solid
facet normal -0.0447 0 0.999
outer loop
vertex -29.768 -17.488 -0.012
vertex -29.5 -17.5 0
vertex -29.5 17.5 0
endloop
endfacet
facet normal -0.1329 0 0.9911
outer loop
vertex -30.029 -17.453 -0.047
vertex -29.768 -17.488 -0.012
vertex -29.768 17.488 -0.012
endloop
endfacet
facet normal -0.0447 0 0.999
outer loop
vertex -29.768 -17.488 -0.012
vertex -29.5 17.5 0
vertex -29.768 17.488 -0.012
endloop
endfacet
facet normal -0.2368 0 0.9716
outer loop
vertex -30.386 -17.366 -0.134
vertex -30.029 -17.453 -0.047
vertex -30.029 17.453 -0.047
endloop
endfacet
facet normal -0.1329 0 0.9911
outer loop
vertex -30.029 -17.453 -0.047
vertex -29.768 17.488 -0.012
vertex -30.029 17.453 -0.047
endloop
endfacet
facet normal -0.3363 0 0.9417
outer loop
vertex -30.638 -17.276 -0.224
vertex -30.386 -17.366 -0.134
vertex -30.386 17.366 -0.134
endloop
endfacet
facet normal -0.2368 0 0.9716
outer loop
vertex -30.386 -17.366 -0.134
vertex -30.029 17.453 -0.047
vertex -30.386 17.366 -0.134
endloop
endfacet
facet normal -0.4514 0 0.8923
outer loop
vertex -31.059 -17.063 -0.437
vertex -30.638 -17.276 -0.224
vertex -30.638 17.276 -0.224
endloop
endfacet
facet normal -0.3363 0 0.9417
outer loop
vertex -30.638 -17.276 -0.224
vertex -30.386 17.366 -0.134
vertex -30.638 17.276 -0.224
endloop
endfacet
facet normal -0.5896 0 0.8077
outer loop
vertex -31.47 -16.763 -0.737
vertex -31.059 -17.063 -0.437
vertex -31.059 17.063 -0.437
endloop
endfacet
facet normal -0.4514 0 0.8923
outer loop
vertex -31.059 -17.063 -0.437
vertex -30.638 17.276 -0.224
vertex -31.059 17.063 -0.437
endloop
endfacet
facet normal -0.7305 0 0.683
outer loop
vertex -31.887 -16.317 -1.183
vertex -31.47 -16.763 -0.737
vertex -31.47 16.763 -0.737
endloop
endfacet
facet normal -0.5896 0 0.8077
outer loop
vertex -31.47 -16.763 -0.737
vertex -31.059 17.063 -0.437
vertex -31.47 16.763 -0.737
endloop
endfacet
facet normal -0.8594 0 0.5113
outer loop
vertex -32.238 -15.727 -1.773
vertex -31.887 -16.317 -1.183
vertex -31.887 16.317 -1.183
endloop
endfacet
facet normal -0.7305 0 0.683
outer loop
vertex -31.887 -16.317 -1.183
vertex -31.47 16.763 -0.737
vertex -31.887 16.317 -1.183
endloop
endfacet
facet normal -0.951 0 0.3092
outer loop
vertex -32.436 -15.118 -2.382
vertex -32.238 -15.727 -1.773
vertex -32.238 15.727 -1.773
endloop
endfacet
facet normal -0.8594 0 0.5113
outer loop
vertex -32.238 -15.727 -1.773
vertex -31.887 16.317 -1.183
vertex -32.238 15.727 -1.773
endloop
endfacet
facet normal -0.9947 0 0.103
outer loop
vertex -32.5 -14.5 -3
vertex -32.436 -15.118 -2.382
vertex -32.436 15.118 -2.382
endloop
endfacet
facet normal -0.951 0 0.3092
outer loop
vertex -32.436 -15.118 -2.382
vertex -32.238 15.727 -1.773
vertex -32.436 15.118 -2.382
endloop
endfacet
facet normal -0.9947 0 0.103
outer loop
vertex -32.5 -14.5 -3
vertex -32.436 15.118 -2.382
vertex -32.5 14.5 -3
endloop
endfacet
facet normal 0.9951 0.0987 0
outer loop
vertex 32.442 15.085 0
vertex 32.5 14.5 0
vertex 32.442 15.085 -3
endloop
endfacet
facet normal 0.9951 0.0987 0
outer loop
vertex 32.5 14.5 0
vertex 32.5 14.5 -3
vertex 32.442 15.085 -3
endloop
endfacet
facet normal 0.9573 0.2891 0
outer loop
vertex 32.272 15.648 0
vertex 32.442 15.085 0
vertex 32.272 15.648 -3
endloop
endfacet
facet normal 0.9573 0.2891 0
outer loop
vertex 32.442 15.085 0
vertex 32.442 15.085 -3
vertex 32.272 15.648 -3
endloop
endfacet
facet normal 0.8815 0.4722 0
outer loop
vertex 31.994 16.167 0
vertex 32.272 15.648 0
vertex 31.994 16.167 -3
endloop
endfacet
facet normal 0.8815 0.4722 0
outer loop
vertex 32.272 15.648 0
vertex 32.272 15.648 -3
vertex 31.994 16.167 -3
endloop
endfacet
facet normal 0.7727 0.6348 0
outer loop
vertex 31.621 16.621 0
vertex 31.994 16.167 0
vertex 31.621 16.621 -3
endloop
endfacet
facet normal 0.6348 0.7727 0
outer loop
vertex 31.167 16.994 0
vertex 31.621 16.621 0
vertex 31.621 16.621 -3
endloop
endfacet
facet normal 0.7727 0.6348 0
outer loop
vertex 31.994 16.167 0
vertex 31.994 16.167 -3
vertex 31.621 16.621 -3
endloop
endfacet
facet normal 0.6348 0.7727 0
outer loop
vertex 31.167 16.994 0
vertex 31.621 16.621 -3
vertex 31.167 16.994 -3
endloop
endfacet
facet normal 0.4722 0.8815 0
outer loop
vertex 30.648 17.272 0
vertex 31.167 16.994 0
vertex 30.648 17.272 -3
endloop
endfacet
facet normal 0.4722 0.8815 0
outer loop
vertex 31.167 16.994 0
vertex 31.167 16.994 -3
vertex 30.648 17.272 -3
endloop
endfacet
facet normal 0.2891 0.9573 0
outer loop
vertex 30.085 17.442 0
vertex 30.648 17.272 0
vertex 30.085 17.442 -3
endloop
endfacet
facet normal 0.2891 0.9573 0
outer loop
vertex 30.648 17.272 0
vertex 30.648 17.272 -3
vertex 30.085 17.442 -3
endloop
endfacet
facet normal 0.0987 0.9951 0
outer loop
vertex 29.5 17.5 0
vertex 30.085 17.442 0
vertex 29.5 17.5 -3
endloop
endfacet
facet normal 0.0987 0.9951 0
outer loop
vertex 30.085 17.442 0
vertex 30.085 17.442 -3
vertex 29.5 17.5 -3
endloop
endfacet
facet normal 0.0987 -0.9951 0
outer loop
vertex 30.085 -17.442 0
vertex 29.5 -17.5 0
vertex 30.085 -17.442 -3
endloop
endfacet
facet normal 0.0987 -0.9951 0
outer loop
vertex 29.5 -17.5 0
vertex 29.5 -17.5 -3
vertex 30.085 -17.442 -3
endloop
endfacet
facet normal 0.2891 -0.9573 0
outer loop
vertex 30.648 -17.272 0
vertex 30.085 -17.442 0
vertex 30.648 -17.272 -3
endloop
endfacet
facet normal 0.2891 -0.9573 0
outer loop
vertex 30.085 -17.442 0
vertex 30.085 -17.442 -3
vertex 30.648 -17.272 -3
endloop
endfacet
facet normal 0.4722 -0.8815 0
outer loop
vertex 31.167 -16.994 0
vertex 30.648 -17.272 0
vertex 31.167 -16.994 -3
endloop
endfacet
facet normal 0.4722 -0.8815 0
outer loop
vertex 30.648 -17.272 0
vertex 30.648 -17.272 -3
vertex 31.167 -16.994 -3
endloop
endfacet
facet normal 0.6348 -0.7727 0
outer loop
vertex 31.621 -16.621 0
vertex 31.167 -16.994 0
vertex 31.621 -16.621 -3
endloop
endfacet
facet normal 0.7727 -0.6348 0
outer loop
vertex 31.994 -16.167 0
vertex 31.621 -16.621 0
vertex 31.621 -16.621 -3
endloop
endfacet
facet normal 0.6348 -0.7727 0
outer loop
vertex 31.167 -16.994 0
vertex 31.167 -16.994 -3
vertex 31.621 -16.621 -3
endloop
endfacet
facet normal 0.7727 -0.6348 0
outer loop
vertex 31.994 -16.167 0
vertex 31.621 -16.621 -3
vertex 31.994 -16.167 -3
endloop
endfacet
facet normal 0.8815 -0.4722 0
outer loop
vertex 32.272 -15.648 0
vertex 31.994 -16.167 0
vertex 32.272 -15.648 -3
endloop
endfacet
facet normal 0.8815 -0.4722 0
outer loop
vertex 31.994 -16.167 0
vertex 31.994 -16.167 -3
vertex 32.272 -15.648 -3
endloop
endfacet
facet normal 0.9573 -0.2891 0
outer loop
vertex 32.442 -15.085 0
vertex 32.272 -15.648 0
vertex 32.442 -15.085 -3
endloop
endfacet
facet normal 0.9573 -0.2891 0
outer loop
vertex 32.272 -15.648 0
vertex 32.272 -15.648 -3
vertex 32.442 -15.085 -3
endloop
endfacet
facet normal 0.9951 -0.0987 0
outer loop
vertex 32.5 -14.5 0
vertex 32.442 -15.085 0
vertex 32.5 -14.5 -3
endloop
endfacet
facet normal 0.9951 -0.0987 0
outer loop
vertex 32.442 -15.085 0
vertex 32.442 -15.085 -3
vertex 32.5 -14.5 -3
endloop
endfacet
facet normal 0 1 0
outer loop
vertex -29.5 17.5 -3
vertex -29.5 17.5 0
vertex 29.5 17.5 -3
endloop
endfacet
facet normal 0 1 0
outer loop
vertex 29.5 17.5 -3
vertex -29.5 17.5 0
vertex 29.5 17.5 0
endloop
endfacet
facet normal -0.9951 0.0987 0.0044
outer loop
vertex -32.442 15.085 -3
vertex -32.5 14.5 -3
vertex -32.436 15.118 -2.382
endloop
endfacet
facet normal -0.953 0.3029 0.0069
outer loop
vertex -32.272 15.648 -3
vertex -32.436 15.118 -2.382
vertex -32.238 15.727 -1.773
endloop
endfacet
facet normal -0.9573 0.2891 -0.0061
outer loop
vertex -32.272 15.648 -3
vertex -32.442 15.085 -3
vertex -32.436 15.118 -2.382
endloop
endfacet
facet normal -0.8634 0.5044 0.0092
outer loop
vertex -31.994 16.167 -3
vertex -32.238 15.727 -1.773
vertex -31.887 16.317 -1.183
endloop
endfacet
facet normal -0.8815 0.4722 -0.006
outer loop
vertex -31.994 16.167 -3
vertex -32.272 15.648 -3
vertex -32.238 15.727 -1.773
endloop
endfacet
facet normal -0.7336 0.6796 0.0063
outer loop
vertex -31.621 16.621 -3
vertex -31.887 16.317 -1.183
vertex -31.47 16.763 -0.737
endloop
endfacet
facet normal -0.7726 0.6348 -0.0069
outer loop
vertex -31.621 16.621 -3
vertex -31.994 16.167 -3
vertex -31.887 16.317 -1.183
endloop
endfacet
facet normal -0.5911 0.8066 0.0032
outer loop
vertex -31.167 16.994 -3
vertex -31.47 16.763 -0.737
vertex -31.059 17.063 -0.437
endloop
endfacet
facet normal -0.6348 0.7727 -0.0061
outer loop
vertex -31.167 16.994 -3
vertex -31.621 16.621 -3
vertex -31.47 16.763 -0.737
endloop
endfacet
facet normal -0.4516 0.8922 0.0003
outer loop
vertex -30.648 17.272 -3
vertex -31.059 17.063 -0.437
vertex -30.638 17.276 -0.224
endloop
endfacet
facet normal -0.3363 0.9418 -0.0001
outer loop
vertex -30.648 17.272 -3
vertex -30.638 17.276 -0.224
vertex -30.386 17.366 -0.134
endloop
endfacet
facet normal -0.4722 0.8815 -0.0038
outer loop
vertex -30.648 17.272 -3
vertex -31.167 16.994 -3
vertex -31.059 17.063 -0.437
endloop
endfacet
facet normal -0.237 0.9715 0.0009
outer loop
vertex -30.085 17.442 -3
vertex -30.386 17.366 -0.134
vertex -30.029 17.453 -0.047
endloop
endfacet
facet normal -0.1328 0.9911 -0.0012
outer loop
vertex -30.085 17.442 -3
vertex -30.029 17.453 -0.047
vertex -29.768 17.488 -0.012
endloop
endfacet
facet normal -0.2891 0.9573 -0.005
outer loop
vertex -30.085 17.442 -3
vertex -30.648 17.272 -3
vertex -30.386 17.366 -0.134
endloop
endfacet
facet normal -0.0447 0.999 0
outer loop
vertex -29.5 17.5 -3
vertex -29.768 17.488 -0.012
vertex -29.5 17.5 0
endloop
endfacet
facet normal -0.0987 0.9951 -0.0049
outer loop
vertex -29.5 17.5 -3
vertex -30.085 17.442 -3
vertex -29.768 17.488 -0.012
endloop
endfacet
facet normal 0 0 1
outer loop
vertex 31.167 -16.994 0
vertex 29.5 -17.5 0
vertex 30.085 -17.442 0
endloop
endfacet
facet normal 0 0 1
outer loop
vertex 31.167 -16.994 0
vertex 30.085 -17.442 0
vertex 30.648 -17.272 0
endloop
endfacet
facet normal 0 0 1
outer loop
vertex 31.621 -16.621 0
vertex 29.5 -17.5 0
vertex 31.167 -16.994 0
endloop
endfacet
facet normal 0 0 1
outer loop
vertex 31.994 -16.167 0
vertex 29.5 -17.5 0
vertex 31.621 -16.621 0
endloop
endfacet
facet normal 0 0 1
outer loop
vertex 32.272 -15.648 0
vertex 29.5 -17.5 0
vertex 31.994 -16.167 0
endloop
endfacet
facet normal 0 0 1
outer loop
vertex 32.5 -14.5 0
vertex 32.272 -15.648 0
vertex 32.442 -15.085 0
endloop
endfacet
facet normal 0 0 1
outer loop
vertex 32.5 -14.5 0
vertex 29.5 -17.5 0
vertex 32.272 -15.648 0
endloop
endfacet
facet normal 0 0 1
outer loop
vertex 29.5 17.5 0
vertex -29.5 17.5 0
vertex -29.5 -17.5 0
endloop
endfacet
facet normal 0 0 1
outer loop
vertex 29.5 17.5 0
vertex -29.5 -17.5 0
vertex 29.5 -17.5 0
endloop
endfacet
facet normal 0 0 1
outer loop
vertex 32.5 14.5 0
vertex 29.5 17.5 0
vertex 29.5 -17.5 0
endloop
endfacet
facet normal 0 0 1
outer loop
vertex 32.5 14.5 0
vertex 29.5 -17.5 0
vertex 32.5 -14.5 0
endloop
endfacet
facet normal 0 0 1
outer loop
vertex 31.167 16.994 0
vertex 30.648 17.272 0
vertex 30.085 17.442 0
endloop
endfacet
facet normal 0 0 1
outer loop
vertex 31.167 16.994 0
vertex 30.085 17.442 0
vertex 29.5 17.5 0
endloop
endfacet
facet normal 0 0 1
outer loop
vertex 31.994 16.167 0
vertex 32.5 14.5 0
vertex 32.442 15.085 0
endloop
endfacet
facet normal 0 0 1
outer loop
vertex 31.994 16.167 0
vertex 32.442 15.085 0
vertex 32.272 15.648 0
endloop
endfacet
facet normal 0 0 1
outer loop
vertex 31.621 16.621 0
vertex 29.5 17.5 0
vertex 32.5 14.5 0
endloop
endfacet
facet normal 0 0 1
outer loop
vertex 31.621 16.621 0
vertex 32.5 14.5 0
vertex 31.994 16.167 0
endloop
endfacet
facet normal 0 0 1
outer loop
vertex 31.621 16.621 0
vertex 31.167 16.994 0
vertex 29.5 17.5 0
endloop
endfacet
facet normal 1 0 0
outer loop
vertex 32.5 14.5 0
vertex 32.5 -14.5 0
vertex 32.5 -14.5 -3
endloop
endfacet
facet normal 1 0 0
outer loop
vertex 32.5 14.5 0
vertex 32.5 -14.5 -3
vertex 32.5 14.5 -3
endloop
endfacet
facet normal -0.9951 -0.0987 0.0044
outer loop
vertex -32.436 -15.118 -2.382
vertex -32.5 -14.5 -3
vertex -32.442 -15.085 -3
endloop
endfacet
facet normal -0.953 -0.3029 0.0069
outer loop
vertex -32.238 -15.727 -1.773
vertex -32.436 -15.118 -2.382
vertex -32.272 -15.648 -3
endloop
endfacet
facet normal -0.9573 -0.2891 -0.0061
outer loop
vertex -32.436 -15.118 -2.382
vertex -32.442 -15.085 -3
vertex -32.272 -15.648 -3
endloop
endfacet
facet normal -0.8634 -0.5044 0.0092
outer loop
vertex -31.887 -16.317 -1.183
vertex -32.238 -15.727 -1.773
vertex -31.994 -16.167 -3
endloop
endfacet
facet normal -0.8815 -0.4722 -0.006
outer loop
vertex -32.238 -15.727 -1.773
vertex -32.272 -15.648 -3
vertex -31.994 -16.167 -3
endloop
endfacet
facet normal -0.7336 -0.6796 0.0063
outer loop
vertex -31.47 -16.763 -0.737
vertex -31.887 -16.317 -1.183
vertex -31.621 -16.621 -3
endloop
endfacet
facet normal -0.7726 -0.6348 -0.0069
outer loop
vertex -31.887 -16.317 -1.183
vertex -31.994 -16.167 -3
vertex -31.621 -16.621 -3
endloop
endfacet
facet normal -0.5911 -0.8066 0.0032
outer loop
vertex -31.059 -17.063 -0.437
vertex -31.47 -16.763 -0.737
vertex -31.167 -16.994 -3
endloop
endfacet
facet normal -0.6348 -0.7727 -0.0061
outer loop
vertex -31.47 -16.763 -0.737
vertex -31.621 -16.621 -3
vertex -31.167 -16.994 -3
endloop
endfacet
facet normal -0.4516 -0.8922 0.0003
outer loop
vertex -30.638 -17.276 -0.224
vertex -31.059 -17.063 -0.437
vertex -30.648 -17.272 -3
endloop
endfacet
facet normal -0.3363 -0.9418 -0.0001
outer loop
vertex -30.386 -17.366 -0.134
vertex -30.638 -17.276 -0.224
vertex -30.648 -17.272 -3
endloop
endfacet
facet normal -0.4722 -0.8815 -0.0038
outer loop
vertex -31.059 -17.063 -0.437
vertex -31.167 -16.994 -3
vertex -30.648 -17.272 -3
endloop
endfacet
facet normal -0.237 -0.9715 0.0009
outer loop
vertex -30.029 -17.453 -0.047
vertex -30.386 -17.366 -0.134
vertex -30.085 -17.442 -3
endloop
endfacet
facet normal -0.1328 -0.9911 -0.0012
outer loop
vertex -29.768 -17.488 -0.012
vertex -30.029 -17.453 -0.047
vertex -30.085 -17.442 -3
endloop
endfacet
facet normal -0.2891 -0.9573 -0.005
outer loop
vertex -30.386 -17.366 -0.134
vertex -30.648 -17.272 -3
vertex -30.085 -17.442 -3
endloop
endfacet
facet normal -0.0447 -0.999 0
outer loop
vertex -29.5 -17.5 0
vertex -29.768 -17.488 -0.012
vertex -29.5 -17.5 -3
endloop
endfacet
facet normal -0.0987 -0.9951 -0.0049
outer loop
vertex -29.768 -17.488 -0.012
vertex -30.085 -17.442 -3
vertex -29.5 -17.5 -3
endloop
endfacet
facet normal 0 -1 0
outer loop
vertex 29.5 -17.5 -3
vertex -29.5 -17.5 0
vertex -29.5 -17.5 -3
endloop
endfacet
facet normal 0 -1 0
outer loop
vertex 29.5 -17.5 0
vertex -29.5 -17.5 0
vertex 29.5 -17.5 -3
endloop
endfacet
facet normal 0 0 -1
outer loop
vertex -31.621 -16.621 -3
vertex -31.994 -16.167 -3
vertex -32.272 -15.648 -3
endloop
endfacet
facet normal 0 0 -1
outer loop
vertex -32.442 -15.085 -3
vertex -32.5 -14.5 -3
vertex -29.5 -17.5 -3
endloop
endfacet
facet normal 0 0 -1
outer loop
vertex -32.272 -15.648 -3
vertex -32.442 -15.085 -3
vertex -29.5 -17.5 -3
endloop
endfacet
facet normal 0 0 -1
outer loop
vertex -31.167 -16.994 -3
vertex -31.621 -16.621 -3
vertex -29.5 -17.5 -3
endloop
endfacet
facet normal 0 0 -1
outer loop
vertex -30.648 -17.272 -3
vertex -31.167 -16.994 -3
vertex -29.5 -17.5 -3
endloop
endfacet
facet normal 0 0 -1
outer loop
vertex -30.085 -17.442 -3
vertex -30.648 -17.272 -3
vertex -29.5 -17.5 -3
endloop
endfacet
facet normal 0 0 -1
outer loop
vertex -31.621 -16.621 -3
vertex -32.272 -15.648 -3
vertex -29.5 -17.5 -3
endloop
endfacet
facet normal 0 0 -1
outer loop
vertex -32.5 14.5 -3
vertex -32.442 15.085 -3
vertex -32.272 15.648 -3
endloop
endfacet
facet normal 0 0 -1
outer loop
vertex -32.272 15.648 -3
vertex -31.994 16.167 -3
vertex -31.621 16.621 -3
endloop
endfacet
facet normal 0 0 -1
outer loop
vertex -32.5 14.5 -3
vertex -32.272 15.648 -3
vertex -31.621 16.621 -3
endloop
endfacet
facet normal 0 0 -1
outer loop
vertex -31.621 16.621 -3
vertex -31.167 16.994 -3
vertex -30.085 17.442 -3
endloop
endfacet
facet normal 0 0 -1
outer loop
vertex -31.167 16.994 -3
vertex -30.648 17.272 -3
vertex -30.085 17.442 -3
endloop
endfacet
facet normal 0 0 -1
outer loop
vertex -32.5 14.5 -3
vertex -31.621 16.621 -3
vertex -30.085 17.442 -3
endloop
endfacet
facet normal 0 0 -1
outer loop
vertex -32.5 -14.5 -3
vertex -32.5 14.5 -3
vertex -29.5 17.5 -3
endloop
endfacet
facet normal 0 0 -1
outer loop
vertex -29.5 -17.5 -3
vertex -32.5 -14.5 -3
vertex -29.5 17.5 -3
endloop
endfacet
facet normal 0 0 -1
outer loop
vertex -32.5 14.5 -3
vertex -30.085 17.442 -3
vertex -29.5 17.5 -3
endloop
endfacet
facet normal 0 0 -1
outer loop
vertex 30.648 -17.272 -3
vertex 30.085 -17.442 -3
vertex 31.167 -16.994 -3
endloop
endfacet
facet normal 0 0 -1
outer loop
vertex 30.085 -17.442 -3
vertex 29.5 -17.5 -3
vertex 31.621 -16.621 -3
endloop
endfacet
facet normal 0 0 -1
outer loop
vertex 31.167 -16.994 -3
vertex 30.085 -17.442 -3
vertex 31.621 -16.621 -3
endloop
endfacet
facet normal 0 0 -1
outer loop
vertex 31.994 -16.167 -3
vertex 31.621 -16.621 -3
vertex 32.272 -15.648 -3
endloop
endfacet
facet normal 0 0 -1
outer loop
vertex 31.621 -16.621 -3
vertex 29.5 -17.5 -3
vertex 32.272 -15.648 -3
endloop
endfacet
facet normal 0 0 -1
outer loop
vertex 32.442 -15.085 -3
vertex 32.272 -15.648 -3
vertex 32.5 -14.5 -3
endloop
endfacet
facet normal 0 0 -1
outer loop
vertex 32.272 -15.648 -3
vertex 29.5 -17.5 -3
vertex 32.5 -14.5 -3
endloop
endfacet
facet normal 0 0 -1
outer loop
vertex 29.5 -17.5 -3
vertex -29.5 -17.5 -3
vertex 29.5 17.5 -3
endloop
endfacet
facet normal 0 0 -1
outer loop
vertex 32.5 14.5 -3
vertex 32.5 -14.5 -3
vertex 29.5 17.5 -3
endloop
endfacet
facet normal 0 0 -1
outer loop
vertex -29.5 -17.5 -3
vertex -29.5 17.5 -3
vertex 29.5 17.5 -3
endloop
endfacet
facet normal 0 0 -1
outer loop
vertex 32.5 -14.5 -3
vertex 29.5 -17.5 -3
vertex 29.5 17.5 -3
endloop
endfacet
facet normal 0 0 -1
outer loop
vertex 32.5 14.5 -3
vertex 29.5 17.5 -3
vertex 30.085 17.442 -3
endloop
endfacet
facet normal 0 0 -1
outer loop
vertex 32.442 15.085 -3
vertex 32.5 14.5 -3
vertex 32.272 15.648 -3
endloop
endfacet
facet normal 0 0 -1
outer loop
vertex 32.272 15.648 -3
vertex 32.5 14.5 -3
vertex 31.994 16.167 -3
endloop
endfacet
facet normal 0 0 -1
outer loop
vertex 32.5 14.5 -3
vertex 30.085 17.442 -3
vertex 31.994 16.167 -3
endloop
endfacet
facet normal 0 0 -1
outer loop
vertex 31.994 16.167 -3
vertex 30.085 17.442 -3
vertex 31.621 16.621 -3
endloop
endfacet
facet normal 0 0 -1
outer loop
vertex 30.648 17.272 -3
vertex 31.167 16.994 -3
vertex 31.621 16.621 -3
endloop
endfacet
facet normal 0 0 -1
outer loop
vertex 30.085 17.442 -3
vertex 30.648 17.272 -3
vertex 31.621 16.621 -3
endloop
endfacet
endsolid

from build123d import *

# Parameters (mm, degrees)
F0_W        = 65
F0_H        = 35
F1_DEPTH    = 3
F2_R        = 3
F3_T1_DEPTH = 44


# Not quite as in the source:
# - a fillet or chamfer that OpenCascade refuses, or shapes differently, is made with other operations: its cross-section is extruded or revolved along the edge and cut away or added


with BuildPart() as f1:
    # F0 (on Top) → F1 (new body)
    with BuildSketch(Plane.XY):
        Rectangle(F0_W, F0_H)
    extrude(amount=-F1_DEPTH)

    # F2
    f2_edges = [f1.edges().sort_by_distance(p)[0] for p in [
        (-32.5, -17.5, -1.5),
        (-32.5, 17.5, -1.5),
        (32.5, 17.5, -1.5),
        (32.5, -17.5, -1.5),
    ]]
    fillet(f2_edges, radius=F2_R)

    # F3: fillet of radius 3 on 1 edges, made by hand

    # F3_s2 → F3_t1 (cut)
    with BuildSketch(Plane.XZ.offset(-22)):
        with BuildLine():
            ThreePointArc((-29.5, 0), (-31.6213203436, -0.8786796564), (-32.5, -3))
            Line((-32.5, -3), (-32.5, 0))
            Line((-32.5, 0), (-29.5, 0))
        make_face()
    extrude(amount=F3_T1_DEPTH, mode=Mode.SUBTRACT)


solid = f1.part
